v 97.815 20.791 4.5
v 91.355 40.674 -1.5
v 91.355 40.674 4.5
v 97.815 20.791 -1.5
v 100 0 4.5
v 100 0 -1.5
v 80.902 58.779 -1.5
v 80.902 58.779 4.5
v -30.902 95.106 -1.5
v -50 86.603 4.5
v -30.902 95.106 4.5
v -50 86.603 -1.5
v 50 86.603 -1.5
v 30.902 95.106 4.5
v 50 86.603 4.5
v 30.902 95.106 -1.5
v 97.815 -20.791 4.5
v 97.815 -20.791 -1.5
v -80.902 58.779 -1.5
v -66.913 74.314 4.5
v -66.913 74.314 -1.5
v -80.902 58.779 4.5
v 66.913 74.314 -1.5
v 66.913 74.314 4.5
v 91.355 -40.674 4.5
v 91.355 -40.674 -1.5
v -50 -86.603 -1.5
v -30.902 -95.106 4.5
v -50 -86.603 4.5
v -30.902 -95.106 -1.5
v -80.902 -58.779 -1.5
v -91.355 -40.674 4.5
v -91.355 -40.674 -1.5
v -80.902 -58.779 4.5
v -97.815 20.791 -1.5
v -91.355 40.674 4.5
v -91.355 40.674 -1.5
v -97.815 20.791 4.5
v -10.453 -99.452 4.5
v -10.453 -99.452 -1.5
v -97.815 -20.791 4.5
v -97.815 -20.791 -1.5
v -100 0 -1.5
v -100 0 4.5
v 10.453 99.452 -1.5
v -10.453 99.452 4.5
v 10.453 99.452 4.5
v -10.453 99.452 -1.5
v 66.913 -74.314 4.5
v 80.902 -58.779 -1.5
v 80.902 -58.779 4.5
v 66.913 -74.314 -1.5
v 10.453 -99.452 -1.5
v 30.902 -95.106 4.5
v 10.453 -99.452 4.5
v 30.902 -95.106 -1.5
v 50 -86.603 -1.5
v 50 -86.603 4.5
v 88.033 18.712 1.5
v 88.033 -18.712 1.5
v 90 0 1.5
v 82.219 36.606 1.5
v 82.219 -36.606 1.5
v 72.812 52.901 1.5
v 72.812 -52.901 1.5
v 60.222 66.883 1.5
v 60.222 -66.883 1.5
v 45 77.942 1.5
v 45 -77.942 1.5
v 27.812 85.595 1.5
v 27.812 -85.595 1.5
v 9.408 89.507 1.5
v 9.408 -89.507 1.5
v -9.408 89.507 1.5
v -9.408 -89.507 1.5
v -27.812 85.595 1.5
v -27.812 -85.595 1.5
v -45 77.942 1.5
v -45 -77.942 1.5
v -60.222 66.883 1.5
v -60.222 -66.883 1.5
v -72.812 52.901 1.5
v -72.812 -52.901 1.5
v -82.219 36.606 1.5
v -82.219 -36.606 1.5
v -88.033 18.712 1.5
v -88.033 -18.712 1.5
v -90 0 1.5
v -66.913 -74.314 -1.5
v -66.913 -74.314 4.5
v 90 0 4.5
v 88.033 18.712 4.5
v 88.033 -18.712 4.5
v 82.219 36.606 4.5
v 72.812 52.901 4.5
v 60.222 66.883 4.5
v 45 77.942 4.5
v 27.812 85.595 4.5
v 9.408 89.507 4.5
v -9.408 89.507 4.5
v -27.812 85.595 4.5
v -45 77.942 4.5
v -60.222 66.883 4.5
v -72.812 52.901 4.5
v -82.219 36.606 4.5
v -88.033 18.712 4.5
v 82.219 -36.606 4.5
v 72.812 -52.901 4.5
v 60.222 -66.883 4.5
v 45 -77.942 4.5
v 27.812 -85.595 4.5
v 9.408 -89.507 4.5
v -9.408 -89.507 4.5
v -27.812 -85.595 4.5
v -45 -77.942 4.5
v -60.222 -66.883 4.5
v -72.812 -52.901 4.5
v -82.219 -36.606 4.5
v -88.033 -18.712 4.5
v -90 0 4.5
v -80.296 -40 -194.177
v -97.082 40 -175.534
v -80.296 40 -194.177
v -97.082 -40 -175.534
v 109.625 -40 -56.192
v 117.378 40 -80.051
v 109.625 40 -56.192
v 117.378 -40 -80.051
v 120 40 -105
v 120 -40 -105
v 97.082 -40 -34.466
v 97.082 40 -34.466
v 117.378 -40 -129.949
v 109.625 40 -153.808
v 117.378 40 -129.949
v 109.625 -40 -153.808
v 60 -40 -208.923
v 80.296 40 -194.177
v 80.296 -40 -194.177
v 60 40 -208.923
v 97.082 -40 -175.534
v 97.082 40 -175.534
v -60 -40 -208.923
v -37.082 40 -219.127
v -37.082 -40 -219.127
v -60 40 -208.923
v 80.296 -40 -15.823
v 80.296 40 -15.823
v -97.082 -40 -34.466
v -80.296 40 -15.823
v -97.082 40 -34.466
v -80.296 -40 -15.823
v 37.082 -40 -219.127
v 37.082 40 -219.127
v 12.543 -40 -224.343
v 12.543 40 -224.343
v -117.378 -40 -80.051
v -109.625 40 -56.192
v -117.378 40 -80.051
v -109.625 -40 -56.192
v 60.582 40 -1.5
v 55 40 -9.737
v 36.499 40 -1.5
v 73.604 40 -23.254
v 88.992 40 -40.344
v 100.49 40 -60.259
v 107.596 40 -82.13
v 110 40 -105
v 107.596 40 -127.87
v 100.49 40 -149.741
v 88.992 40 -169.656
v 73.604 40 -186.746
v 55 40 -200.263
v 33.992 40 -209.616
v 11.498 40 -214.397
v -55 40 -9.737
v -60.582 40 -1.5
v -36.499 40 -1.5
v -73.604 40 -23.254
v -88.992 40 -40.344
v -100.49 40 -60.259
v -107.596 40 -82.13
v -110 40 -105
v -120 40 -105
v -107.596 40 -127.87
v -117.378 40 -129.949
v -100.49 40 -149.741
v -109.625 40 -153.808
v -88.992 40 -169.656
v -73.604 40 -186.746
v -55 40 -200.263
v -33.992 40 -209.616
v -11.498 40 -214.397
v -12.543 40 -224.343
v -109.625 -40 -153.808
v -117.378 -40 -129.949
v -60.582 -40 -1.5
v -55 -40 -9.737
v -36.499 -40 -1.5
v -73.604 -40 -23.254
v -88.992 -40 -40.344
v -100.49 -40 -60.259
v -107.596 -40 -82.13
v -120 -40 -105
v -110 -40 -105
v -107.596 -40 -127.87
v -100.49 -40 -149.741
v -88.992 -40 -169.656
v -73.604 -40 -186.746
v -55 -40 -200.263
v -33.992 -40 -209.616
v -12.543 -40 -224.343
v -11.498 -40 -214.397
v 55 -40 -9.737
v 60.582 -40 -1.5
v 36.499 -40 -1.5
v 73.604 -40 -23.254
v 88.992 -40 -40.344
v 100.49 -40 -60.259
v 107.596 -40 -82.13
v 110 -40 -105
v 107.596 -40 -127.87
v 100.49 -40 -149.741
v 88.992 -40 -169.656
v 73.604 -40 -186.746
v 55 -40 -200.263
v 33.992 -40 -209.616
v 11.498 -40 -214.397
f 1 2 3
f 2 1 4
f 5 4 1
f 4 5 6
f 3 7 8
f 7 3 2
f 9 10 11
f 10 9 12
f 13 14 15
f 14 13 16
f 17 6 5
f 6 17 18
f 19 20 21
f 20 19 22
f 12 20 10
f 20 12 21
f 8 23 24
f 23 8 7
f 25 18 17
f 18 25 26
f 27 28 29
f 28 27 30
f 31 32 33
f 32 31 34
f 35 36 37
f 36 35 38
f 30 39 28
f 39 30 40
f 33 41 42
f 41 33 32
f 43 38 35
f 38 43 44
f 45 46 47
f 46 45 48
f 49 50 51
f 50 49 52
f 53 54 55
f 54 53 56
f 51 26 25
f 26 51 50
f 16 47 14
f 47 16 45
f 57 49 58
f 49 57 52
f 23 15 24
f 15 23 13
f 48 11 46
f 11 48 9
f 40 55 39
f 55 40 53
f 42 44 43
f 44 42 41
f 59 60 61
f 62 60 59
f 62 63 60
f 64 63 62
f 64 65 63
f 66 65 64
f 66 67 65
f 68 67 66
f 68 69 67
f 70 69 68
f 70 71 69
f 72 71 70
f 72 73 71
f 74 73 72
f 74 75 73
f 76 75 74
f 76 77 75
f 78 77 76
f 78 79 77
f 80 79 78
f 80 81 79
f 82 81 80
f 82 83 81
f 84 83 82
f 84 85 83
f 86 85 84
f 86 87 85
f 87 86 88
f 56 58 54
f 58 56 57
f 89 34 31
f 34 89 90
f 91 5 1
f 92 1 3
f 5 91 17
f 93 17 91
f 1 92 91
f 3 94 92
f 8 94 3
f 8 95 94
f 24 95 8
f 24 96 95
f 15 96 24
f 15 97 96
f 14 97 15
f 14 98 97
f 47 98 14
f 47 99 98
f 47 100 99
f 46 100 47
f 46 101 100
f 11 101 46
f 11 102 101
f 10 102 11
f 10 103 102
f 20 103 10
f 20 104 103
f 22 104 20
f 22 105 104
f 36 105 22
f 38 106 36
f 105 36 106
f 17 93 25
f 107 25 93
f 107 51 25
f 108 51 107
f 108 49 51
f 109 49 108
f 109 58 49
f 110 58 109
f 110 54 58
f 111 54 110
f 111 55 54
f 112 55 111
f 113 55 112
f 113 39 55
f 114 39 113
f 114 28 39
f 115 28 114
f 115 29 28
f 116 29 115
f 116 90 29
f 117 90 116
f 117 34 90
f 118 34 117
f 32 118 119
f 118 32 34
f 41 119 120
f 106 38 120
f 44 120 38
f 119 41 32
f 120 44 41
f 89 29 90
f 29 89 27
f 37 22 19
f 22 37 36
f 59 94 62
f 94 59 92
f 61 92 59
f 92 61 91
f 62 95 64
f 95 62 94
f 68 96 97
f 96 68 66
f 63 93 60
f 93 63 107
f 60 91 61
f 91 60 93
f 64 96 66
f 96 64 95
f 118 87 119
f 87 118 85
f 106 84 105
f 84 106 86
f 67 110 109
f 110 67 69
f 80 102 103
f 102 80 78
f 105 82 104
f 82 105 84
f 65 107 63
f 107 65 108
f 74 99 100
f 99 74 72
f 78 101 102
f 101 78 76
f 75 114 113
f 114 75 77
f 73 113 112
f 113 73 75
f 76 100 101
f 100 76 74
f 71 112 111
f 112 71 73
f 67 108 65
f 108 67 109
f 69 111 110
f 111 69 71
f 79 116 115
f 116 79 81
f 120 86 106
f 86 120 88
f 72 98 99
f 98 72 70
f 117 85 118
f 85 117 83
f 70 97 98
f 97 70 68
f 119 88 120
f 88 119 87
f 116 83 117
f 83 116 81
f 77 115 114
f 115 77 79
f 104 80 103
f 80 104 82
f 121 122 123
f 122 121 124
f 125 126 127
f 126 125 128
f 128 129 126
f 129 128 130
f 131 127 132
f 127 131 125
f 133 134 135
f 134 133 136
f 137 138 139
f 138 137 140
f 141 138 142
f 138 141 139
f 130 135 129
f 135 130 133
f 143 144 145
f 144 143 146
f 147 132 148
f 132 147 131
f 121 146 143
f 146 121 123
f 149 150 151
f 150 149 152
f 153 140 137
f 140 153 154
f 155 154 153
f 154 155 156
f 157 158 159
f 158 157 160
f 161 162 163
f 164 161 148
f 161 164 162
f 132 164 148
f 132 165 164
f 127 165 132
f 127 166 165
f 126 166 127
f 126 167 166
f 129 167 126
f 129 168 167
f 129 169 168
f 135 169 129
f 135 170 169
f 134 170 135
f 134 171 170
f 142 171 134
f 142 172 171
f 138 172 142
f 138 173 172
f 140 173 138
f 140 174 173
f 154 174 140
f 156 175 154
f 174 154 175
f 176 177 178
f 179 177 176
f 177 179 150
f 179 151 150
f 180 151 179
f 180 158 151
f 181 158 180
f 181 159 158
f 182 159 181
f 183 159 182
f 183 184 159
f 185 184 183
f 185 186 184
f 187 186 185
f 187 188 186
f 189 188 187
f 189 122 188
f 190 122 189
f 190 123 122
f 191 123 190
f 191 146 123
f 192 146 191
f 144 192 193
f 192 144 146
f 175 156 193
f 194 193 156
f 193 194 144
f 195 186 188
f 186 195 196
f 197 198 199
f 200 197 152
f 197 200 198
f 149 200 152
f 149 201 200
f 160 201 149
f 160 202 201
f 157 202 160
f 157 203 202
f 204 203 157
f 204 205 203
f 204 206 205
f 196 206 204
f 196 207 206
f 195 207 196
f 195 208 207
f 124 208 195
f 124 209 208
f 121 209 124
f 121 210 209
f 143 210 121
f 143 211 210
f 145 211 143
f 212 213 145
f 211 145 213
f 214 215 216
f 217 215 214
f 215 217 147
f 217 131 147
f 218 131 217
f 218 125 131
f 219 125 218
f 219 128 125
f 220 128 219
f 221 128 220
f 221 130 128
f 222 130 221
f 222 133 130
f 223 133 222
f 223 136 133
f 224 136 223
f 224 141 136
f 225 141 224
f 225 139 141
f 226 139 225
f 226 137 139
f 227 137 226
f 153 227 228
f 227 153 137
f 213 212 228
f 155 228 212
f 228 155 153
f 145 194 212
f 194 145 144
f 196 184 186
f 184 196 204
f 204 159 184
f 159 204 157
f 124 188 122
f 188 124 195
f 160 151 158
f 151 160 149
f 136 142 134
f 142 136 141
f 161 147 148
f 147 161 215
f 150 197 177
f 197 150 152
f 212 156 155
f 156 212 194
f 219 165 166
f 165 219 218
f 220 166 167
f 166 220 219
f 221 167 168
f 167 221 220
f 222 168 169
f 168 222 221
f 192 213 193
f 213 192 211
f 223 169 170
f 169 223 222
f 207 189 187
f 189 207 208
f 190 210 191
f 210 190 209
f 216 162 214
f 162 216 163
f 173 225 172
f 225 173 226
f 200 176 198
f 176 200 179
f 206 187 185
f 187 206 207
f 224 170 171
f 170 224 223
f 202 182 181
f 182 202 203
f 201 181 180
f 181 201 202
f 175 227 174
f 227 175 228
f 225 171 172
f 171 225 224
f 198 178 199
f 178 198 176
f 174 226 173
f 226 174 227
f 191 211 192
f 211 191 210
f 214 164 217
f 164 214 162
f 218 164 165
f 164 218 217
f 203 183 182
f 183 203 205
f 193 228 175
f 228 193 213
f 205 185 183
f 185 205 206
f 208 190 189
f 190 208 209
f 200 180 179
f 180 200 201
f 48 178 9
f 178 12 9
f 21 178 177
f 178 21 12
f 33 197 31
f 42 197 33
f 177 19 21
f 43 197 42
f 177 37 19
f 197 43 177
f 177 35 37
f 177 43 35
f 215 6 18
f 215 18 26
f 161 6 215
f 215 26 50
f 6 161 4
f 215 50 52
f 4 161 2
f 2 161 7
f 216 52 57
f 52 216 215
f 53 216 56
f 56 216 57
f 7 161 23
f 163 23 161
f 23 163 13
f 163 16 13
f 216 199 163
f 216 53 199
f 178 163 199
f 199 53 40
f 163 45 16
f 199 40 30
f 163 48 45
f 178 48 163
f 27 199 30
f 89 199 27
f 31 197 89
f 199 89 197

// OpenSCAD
color("yellow")
//    translate([0,0,5])
//    cube([200,200,5], center = true);
intersection(){
    translate([0,0,11])
    cube([200,200,20], center = true);
    scale([1,1,0.1])
    surface("dickbutt.png", center = true);
}

color("blue")
translate(0,0,-9)
cylinder(r=100, h=3, center=true);

color("red")
translate([0,0,3])
difference(){
    cylinder(r=100, h=3, center=true);
    cylinder(r=90, h=5, center=true);
}
color("green")
difference(){
    translate([0,0,-105])
    rotate([90,0,0])
    difference(){
        cylinder(r=120, h=80, center=true);
        cylinder(r=110, h=90, center=true);
    }
    translate([0,0,100])
    cube([200,200,200],center = true);
}
